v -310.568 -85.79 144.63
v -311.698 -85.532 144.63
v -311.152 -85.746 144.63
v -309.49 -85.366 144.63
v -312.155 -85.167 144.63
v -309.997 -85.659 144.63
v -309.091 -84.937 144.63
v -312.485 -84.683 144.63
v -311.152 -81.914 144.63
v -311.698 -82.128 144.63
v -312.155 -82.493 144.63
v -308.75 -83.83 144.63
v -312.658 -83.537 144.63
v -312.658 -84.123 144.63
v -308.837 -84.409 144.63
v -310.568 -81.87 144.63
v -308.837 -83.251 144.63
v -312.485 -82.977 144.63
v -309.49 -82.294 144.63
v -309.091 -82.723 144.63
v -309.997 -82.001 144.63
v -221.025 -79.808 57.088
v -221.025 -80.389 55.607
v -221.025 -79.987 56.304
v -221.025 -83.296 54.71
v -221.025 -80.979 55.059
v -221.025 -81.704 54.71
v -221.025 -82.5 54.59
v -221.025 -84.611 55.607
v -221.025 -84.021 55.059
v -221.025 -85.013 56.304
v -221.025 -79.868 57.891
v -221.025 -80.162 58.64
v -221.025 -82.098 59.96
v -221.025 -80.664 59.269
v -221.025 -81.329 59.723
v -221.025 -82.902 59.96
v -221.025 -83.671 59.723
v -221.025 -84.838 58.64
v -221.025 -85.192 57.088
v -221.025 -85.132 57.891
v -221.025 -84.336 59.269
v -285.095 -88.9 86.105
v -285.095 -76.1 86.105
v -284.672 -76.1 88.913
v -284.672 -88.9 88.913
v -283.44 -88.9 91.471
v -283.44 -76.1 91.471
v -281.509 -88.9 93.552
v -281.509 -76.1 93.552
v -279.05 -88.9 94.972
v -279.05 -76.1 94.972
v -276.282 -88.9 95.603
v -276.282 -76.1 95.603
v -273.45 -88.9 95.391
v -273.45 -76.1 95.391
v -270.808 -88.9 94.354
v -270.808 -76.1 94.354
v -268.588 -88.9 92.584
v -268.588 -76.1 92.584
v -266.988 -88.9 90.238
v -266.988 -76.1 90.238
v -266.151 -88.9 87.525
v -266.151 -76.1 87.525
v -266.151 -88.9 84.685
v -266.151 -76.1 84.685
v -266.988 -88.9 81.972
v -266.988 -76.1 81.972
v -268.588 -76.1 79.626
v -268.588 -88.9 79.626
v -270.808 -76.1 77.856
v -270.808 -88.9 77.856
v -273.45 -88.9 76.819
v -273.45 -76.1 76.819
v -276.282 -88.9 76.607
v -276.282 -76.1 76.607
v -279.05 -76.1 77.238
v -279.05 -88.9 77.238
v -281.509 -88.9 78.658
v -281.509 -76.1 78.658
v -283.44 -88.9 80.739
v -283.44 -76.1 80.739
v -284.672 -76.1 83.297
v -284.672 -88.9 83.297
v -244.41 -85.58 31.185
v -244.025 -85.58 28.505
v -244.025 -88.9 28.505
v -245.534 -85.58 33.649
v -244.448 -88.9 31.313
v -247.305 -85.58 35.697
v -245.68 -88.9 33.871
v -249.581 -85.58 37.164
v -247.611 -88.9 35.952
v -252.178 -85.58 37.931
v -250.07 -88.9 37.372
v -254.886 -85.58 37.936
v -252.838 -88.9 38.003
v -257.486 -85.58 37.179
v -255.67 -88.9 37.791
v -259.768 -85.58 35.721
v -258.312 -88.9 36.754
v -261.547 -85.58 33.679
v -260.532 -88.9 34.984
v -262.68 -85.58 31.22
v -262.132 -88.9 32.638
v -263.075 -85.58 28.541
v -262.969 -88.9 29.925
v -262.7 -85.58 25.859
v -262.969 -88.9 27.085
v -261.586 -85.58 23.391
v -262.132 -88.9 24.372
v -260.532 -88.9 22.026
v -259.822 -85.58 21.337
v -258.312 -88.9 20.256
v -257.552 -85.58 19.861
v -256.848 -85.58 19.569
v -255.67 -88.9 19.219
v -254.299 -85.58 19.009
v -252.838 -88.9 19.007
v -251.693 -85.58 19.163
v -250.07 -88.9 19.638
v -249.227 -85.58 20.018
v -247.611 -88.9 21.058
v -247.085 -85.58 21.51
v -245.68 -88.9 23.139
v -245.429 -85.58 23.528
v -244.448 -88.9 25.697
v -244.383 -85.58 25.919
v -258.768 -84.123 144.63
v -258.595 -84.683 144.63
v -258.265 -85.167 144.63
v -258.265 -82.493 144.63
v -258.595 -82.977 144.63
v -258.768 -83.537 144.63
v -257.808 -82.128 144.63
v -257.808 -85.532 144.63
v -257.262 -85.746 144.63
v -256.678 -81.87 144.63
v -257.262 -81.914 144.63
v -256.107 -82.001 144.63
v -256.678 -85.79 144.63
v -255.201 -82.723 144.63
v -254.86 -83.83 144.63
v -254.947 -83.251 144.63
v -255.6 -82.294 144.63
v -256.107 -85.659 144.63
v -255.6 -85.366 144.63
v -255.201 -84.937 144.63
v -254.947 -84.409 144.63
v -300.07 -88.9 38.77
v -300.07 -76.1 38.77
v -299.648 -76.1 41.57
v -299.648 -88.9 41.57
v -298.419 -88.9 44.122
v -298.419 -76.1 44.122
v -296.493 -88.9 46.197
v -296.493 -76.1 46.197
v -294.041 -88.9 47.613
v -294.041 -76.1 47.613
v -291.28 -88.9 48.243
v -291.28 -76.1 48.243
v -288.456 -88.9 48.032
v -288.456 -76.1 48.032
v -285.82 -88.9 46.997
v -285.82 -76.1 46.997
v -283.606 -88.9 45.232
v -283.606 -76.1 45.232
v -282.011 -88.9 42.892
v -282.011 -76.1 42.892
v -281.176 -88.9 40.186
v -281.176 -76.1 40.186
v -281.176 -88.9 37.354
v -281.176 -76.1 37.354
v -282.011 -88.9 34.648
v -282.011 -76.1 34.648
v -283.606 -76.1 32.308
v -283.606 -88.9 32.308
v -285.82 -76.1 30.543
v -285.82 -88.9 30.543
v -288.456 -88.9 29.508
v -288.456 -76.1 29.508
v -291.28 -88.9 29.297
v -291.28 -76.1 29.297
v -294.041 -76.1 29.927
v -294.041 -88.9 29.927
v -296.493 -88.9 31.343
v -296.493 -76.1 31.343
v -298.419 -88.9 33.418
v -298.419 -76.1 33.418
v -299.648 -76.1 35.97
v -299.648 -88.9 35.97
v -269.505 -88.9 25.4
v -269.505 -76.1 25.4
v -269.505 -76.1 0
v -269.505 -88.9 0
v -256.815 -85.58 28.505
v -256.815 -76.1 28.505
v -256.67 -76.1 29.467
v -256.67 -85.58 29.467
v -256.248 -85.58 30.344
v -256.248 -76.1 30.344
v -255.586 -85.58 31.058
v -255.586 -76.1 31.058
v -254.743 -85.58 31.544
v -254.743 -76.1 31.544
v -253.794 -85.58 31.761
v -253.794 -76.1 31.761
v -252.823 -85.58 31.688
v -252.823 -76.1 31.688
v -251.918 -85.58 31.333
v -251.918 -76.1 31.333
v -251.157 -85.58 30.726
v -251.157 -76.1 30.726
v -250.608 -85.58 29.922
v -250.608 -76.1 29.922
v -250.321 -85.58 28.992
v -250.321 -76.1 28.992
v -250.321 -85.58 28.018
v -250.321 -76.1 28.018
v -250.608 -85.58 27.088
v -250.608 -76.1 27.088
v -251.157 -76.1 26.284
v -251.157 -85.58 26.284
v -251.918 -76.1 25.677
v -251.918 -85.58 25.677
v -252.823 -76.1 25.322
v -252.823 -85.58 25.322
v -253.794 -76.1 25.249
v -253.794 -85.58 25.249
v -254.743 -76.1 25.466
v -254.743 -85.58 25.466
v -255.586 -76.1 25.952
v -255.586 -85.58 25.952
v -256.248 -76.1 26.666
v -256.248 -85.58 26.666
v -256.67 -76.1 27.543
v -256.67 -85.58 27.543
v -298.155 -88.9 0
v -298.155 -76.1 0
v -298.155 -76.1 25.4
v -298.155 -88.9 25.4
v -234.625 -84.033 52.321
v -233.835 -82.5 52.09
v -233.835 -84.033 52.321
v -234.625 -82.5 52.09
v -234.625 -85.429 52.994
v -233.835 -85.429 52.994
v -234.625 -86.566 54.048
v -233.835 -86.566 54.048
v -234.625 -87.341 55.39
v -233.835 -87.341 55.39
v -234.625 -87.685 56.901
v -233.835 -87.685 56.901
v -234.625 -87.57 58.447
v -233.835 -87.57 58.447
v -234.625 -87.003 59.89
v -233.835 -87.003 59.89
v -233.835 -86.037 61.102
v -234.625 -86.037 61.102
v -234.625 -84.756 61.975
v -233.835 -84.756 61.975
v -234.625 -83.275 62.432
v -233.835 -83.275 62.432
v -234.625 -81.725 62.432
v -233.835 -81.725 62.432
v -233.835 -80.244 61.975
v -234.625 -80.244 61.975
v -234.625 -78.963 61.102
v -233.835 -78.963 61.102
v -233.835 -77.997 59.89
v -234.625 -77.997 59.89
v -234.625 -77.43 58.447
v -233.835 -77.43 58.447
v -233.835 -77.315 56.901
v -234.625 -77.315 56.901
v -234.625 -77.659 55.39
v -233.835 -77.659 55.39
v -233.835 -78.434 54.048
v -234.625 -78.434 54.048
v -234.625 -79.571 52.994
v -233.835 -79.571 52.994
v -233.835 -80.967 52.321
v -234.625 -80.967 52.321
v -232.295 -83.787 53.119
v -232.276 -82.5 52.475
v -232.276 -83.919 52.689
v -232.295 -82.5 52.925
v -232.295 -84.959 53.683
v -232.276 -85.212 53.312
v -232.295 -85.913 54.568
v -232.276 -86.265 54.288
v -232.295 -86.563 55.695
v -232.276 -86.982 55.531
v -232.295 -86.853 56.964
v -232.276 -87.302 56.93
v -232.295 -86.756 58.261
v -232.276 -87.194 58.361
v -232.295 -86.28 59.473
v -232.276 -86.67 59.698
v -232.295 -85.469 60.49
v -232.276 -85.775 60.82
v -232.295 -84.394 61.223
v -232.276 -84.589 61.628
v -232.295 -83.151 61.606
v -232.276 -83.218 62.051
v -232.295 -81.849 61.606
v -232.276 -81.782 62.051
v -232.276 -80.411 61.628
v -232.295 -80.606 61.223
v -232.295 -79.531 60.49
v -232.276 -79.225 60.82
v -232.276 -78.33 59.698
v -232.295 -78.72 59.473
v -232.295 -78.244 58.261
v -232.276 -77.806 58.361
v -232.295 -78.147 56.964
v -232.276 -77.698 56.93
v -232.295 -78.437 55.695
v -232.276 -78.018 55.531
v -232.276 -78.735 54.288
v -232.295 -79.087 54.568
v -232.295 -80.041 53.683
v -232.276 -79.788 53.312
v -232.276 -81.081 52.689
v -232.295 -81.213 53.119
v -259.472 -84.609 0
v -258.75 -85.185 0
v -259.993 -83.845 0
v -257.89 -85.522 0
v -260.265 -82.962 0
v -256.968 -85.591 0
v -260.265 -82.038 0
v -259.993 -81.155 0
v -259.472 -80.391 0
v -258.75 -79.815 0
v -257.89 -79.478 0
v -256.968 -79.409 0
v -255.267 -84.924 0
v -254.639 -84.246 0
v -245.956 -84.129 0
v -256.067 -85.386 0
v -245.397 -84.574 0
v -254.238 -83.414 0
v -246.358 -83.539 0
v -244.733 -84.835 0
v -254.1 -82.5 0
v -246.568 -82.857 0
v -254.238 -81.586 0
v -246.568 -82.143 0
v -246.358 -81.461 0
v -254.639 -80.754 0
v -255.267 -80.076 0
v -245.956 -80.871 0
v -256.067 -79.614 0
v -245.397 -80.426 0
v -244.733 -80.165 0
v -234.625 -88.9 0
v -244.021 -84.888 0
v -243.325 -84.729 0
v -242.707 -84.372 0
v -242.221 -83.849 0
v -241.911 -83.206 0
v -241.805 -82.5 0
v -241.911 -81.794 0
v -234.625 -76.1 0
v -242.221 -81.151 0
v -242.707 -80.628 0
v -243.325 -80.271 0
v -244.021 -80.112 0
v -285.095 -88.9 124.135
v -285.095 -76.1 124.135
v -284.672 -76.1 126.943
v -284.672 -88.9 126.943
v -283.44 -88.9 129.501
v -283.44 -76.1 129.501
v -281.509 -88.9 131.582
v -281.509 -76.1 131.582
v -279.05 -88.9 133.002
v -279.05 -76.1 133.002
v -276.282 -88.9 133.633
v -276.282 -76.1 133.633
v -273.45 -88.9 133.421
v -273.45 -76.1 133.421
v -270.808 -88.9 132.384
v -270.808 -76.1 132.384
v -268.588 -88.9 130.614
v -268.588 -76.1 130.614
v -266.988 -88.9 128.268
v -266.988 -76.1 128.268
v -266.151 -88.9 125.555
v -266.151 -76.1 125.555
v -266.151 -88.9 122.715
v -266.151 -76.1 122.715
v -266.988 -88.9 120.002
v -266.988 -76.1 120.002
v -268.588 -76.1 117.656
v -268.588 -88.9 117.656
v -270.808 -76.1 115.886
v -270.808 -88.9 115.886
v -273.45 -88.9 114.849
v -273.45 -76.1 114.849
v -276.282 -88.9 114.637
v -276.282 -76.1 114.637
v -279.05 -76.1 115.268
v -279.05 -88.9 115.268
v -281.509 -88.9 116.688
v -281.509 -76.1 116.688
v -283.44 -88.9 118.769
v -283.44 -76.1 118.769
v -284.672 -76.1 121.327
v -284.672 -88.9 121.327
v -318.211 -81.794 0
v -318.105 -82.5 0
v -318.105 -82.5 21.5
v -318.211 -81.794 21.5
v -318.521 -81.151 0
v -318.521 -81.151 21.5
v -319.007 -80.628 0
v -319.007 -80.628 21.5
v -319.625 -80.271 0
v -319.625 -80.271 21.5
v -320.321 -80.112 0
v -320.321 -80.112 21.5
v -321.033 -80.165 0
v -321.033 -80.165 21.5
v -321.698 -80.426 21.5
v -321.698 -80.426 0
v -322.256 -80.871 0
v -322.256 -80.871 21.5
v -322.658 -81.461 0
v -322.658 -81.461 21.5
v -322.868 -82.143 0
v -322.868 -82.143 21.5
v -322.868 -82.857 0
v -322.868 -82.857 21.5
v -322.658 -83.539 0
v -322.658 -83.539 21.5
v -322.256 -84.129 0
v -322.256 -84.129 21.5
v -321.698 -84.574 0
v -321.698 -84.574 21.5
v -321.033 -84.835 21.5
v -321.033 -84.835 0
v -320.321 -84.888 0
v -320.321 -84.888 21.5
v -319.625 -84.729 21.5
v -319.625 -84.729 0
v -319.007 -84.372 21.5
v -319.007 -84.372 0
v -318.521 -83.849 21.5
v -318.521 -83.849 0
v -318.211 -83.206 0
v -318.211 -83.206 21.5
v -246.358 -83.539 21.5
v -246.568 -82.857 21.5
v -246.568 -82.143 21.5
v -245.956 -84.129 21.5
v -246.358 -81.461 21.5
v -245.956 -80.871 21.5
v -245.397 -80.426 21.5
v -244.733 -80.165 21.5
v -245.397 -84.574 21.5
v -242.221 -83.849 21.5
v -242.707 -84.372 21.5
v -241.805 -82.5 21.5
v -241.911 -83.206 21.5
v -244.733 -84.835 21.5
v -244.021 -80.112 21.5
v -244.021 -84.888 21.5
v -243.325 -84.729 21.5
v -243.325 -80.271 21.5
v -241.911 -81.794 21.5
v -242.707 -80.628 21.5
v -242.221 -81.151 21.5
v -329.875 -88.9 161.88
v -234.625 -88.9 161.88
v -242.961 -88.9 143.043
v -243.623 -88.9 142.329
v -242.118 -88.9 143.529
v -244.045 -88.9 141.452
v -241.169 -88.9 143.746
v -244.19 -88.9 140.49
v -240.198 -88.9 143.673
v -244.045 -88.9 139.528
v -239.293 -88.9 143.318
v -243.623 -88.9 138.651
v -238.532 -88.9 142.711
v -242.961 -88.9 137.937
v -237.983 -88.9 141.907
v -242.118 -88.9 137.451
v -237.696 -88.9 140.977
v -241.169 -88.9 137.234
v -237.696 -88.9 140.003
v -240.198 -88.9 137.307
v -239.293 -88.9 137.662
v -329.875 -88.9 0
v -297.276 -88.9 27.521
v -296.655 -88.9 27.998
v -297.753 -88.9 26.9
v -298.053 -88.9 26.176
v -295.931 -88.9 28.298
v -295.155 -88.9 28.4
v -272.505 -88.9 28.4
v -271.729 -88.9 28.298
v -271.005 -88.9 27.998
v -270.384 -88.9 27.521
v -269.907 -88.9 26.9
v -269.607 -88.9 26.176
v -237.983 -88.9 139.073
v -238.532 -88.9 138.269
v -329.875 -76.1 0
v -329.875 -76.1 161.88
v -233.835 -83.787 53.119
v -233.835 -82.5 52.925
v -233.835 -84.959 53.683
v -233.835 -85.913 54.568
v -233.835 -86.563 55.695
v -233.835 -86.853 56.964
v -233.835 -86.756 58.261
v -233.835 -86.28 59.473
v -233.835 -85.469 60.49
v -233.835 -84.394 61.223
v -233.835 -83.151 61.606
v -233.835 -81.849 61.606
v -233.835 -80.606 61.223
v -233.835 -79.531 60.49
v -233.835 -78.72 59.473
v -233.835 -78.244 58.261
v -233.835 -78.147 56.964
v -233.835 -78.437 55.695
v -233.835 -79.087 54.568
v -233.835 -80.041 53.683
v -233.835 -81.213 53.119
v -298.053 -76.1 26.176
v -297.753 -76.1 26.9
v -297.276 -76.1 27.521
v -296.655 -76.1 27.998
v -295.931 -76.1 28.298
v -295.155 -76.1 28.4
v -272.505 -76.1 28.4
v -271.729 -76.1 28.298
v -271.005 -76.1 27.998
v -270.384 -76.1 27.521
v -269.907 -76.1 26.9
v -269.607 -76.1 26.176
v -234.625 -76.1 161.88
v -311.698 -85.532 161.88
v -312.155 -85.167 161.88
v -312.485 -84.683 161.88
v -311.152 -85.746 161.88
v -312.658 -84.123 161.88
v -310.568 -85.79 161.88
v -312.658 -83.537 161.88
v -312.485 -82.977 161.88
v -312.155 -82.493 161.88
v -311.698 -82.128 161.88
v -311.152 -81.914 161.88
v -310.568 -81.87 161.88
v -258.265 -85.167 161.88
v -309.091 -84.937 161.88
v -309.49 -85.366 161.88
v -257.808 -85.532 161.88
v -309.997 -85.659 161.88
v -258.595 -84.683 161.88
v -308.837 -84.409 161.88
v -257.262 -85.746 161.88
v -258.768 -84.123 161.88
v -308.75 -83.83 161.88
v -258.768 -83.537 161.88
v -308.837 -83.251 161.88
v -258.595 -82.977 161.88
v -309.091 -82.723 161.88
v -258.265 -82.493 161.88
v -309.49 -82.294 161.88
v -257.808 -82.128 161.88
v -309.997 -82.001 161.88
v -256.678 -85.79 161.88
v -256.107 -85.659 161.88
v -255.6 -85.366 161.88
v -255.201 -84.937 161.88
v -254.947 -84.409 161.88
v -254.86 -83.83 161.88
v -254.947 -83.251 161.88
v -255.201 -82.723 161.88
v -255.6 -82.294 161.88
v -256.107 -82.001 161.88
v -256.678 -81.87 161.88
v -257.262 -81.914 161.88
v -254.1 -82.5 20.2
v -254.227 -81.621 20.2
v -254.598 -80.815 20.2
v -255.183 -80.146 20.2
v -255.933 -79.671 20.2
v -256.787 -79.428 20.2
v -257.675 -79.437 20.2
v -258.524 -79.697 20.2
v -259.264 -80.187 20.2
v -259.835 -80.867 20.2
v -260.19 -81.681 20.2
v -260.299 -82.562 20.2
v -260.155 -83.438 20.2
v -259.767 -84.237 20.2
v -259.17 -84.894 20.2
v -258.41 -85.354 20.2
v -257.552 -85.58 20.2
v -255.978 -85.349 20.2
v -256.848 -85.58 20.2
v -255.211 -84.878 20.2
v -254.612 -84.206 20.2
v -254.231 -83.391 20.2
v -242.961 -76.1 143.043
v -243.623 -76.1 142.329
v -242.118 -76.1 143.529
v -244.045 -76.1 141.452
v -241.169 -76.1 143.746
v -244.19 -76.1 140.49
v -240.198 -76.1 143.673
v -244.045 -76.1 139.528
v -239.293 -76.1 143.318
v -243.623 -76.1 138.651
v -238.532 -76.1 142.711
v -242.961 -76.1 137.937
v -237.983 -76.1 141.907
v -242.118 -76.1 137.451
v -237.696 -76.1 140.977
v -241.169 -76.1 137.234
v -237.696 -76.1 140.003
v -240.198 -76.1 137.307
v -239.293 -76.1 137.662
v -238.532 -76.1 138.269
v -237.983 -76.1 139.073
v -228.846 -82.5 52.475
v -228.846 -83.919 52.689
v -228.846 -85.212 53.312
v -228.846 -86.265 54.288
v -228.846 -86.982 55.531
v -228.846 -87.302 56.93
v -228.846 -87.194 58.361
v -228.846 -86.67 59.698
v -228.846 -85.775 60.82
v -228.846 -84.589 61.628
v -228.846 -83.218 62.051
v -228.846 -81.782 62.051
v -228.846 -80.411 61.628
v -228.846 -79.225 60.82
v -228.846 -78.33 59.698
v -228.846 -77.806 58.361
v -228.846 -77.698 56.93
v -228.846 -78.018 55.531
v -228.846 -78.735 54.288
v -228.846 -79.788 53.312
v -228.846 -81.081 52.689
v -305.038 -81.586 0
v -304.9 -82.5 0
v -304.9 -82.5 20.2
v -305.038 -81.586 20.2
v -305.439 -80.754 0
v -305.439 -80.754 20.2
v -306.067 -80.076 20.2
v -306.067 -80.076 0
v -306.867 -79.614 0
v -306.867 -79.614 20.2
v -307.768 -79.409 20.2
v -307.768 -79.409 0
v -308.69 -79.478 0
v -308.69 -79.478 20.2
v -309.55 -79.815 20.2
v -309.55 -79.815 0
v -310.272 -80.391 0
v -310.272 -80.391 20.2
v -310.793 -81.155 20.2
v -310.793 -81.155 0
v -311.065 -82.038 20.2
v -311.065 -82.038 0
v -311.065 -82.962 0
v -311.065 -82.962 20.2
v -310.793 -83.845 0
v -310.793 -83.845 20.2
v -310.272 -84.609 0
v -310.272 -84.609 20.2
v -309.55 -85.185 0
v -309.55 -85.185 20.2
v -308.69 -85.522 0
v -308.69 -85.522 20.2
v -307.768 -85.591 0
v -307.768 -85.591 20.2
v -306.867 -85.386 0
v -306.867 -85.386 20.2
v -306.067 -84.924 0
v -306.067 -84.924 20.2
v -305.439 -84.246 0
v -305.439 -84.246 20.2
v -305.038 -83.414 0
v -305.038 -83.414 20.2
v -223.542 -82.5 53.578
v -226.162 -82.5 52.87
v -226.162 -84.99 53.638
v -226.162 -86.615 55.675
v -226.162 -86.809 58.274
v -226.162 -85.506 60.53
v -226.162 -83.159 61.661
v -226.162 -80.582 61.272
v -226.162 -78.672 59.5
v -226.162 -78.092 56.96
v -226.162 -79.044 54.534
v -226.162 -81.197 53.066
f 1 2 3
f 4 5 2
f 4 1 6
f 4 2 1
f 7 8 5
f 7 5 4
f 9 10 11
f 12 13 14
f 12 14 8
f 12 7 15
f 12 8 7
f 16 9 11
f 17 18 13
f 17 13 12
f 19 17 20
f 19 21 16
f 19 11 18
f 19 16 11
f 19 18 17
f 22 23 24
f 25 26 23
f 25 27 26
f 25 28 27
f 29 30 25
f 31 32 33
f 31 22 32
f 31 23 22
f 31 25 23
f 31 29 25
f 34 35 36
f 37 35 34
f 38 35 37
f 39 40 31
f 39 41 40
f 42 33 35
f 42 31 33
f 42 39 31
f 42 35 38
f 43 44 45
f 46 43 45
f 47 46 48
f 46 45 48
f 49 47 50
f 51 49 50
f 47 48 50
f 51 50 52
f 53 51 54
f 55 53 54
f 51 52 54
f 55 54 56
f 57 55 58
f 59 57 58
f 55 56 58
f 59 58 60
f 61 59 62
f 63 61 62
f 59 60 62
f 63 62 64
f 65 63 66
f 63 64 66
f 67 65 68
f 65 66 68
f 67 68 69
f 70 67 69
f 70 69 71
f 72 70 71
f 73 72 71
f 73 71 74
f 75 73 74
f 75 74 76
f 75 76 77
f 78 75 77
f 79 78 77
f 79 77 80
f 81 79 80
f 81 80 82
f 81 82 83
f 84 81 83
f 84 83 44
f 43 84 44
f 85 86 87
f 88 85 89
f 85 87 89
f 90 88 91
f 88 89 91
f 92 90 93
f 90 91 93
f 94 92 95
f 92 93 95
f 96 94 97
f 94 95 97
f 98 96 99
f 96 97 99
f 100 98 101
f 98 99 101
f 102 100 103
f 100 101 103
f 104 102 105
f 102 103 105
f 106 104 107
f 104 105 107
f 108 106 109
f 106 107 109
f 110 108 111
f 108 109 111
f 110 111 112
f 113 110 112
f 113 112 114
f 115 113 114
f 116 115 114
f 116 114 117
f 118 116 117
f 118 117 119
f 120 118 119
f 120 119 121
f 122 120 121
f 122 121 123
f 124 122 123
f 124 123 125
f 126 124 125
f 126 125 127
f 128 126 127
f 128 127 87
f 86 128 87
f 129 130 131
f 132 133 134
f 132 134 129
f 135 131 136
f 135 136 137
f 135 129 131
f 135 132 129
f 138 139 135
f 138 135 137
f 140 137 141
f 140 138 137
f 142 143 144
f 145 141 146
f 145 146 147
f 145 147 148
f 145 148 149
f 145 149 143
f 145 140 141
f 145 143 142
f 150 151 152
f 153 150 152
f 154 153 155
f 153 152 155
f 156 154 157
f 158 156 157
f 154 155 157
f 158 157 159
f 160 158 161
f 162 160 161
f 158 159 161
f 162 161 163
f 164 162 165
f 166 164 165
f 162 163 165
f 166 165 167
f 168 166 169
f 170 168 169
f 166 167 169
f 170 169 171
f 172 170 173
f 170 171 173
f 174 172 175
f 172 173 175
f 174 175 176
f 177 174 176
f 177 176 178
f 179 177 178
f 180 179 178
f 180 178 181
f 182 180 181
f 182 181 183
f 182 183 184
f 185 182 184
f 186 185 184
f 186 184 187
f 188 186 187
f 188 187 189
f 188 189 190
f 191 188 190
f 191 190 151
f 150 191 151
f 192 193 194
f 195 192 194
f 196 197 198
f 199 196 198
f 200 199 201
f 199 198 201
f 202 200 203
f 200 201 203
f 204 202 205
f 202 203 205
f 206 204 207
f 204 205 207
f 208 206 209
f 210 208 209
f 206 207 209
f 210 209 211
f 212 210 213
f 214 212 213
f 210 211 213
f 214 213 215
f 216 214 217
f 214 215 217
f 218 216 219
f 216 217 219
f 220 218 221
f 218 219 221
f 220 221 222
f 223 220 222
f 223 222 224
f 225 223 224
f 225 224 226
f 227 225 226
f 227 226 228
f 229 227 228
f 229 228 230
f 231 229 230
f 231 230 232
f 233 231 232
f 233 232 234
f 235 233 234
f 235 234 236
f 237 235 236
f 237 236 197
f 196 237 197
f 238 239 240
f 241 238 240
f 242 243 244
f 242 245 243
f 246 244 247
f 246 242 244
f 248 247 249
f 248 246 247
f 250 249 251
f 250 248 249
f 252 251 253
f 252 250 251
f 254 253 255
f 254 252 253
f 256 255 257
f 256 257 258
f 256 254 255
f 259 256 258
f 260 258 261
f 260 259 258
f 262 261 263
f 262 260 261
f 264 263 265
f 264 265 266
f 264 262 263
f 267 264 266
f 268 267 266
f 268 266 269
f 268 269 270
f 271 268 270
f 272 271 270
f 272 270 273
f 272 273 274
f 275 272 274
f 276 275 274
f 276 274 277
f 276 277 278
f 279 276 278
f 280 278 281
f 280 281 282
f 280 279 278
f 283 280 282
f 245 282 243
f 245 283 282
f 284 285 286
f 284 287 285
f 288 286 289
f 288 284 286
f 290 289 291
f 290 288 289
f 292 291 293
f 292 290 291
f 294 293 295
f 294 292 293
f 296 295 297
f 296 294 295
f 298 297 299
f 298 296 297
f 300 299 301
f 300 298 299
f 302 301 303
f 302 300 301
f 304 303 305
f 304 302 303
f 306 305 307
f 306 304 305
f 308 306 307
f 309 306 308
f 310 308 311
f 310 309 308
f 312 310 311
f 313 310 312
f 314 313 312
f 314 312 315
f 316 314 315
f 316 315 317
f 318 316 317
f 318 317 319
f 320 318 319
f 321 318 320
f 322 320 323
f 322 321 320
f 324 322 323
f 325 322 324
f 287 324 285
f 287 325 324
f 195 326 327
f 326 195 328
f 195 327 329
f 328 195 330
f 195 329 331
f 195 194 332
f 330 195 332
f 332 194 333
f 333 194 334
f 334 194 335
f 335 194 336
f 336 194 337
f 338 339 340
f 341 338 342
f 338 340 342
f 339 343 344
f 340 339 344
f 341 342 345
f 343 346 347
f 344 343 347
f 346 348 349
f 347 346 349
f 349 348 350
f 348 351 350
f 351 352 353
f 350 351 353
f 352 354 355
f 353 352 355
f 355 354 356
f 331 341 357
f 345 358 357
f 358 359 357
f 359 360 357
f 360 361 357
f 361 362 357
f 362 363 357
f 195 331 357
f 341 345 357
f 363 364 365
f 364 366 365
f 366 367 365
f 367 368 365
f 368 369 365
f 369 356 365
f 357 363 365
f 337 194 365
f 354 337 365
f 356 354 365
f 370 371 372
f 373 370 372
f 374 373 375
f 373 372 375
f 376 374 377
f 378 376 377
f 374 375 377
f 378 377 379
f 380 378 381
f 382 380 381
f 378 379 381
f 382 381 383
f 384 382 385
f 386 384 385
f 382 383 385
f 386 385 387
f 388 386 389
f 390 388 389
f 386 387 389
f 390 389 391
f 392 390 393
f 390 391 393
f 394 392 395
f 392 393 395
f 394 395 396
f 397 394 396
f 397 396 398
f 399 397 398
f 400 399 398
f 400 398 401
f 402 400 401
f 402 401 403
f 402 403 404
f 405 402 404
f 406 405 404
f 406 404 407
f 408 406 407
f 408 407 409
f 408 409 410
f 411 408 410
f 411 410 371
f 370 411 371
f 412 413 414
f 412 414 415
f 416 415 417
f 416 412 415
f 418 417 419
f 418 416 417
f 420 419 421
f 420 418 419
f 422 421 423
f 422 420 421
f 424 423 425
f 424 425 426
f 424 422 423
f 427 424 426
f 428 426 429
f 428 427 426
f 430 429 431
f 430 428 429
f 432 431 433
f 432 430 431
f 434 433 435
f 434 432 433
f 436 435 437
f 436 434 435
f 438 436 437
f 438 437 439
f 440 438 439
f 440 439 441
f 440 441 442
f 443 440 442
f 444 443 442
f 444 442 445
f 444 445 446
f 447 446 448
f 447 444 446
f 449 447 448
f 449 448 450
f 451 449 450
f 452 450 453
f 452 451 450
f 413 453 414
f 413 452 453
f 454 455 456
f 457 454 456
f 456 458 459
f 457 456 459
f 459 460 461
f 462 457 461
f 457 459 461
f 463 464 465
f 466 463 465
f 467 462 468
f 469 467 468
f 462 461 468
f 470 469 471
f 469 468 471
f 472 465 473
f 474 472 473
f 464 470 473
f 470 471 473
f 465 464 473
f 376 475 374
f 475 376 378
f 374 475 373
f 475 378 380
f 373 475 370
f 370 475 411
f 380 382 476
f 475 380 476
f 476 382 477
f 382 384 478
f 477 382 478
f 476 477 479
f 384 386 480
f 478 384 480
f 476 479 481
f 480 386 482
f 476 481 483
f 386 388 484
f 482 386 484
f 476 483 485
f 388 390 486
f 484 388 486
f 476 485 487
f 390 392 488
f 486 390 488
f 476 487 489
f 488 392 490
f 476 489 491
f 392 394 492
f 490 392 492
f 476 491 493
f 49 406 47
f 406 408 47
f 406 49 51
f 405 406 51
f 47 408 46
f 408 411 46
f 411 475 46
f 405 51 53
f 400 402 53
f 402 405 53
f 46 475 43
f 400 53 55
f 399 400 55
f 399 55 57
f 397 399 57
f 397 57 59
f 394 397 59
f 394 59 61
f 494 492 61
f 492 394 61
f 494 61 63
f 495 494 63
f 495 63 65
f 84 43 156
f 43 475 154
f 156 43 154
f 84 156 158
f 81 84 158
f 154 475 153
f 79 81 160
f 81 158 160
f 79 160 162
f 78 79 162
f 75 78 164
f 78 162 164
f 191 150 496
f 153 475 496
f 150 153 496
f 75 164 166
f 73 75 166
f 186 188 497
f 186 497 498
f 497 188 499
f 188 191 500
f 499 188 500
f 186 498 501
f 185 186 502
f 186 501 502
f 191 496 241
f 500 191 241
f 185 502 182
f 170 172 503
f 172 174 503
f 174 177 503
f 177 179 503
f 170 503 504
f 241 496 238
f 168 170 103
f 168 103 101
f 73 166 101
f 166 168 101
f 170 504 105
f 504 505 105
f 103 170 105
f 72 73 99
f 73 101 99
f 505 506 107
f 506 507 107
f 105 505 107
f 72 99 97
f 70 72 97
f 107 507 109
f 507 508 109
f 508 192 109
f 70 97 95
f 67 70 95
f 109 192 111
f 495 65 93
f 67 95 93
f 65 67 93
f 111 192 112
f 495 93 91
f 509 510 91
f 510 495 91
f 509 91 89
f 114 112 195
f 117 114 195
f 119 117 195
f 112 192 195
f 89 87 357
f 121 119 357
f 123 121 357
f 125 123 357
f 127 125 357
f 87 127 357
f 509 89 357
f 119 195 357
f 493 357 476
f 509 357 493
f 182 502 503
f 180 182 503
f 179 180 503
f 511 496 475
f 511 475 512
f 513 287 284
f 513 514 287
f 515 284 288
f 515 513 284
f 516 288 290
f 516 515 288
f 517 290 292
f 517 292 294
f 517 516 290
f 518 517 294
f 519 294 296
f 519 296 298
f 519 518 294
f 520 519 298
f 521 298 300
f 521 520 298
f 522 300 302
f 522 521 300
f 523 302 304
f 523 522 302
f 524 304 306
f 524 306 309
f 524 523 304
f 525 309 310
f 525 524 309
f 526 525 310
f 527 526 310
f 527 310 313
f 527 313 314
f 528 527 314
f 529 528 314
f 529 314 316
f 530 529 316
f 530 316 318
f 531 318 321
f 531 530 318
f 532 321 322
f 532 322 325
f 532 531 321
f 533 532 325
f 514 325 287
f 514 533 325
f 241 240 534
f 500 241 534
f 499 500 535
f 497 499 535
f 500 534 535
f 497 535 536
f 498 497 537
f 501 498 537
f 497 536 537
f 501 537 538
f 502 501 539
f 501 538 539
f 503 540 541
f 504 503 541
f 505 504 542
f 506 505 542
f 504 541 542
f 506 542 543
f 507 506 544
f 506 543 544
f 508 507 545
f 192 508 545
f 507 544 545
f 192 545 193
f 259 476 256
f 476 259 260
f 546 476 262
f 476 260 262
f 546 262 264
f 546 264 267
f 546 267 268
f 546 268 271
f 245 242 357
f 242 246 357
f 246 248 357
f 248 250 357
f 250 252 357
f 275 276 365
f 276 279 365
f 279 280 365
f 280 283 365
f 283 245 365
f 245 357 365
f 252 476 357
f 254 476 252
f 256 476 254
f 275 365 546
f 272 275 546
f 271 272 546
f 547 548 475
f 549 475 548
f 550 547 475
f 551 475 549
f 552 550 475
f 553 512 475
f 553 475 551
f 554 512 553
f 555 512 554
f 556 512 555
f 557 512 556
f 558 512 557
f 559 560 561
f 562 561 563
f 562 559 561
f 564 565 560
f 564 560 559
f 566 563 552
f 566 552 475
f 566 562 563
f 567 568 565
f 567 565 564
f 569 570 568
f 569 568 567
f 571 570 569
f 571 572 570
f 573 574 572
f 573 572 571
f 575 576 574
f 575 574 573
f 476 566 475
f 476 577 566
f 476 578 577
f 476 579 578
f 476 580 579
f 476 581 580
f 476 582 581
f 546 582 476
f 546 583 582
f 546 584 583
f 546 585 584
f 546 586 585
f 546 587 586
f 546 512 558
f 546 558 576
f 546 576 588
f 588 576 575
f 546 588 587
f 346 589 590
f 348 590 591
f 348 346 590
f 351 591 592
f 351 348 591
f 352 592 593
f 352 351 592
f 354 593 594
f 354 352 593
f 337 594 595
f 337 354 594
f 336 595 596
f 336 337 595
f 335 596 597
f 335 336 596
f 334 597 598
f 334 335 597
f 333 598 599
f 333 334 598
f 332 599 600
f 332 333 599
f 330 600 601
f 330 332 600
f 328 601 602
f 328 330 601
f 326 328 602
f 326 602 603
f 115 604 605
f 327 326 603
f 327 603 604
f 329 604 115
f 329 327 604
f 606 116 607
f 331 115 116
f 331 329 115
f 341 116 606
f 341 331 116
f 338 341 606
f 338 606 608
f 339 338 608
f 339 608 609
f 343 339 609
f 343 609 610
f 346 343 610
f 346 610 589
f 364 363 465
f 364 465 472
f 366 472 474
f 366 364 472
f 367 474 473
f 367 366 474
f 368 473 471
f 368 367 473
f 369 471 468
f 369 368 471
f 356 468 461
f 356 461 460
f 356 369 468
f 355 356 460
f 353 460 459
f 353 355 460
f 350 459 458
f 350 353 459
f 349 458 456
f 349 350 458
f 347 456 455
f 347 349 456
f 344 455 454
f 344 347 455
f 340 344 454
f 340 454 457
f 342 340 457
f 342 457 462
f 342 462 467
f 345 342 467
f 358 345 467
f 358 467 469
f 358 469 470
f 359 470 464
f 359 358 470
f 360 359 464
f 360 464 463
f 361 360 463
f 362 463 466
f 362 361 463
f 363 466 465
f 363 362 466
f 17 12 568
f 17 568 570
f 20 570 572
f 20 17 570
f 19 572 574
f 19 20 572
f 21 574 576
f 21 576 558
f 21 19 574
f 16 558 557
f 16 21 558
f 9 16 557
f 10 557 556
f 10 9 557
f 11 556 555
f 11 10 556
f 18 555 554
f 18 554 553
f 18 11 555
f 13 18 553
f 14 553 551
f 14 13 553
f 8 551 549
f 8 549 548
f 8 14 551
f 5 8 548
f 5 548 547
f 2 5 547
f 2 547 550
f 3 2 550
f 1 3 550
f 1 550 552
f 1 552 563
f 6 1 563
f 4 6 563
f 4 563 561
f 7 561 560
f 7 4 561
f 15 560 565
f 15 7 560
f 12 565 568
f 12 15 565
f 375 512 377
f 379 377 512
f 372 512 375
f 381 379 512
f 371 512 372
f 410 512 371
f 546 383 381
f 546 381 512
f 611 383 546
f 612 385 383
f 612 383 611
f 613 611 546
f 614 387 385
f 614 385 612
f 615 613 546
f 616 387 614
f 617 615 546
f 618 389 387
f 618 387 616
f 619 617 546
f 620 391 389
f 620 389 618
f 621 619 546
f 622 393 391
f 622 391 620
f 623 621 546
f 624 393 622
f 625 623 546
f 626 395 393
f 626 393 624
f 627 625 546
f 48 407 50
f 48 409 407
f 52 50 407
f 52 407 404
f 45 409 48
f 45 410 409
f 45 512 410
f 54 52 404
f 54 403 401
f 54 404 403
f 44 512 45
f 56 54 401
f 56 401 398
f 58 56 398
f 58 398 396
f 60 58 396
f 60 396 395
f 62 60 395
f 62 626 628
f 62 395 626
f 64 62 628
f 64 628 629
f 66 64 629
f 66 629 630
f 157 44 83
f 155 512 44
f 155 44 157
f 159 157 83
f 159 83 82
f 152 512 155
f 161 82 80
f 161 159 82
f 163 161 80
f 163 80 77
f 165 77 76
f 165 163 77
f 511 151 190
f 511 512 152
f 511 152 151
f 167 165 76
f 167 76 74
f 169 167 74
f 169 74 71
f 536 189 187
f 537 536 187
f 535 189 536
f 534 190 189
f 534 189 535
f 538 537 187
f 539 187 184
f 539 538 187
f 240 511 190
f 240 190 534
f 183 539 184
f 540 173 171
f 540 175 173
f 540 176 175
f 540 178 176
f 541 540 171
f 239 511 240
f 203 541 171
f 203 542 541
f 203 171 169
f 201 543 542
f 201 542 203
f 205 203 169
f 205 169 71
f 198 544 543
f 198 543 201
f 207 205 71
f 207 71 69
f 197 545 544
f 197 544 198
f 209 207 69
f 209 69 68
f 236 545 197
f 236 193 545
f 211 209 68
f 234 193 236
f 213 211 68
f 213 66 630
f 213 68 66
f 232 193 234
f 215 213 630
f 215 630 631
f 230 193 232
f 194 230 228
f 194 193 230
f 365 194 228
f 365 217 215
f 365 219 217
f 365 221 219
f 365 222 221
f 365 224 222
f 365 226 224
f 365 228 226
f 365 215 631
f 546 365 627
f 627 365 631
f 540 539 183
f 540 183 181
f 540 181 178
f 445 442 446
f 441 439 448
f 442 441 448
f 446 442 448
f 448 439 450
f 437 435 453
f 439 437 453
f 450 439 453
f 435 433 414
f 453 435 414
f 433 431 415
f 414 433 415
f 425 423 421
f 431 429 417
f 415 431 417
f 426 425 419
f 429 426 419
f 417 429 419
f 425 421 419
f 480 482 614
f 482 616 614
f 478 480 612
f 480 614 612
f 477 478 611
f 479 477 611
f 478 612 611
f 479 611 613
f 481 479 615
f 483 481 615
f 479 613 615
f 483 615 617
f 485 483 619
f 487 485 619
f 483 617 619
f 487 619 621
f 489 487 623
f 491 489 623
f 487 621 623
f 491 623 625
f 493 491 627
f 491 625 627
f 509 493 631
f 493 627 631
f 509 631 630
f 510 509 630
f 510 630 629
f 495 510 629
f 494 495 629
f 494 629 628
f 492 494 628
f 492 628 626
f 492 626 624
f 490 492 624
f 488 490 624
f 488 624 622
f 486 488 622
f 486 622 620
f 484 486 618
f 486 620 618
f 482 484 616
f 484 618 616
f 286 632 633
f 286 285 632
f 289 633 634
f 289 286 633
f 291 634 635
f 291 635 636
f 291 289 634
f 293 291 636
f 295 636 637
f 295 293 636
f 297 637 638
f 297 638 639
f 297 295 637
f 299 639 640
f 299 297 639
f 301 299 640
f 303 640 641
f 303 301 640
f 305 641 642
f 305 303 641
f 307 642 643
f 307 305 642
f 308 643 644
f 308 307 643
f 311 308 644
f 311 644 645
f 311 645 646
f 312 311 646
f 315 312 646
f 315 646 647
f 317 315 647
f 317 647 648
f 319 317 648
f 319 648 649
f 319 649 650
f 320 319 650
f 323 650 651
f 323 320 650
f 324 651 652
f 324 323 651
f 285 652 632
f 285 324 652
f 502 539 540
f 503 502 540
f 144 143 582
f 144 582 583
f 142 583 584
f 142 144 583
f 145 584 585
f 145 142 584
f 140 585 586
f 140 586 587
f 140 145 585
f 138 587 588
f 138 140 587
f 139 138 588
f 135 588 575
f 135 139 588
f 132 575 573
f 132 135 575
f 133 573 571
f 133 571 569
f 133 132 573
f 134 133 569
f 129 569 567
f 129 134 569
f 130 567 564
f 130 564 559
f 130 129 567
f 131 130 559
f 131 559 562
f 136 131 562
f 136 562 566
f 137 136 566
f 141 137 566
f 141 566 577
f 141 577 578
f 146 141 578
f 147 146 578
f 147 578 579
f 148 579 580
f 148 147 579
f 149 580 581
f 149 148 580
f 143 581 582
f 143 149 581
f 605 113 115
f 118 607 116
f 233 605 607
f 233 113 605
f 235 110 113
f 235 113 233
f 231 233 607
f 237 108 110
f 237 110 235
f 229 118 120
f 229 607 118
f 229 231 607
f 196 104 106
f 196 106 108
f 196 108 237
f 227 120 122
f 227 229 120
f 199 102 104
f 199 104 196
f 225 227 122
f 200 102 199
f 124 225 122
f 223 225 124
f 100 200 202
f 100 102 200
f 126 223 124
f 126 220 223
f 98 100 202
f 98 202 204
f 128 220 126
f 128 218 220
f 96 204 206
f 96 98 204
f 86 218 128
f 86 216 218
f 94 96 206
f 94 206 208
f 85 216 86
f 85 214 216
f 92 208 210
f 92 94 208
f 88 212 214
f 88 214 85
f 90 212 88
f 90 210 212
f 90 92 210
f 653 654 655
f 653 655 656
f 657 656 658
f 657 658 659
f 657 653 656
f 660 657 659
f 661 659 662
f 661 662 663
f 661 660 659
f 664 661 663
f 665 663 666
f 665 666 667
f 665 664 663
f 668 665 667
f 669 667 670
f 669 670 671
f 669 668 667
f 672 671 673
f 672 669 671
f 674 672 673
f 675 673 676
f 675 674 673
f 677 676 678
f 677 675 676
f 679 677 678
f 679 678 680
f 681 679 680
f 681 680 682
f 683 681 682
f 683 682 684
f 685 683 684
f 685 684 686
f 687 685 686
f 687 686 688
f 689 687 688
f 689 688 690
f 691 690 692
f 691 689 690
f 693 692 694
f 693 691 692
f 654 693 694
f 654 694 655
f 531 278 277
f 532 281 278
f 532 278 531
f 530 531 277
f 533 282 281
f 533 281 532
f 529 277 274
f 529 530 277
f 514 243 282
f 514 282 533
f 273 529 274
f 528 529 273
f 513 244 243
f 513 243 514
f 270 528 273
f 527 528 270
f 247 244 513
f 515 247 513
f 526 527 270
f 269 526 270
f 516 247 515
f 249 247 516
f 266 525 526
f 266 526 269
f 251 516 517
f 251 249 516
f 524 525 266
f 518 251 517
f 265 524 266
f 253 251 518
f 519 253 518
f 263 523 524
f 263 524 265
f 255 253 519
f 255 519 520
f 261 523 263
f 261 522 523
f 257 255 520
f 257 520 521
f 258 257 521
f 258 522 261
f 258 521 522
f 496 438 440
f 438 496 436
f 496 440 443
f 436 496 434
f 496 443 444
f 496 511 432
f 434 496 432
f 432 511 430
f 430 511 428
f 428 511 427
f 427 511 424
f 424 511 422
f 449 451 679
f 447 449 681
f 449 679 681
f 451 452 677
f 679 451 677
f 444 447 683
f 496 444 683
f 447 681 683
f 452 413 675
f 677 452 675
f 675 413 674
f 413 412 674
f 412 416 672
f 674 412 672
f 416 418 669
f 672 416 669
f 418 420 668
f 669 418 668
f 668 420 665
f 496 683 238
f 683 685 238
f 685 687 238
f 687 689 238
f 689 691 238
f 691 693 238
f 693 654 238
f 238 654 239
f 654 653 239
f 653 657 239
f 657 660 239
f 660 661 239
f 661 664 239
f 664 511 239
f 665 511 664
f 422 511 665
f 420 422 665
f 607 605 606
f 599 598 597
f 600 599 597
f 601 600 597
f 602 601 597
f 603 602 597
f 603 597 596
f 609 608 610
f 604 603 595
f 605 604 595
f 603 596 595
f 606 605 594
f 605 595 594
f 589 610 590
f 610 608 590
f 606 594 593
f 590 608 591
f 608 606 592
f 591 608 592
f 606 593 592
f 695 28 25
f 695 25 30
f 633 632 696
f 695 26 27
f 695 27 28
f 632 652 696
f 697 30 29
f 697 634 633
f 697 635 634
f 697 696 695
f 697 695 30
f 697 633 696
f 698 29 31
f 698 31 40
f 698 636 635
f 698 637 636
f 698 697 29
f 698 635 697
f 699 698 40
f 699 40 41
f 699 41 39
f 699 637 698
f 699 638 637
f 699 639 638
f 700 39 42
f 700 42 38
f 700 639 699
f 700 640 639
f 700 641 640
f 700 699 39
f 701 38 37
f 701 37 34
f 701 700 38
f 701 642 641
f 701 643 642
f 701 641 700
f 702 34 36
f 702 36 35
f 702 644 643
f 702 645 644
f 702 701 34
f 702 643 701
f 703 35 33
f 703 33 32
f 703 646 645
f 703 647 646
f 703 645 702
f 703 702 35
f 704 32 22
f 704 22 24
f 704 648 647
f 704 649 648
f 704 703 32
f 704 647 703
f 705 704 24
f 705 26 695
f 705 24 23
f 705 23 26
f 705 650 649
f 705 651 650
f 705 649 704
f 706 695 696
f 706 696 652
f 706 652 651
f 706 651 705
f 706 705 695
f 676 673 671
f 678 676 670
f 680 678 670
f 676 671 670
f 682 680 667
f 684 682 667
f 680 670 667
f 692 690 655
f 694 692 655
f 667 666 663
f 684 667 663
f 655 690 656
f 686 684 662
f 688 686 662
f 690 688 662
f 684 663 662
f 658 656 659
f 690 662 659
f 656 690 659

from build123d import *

# Parameters (mm, degrees)
SKETCH1_W           = 95.25
SKETCH1_H           = 12.8
BOSS_EXTRUDE1_DEPTH = 161.88
SKETCH1_3_R         = 3.1
CUT_EXTRUDE1_DEPTH  = 20.2
SKETCH1_4_R         = 2.395
CUT_EXTRUDE2_DEPTH  = 21.5
CUT_EXTRUDE3_REACH  = 14.8
SKETCH2_R           = 9.525
SKETCH2_R_2         = 3.265
SKETCH3_R           = 3.265
SKETCH3_R_2         = 9.525
CUT_EXTRUDE4_DEPTH  = 3.32
CUT_EXTRUDE5_START  = -17.25
SKETCH4_R           = 1.965
CUT_EXTRUDE5_DEPTH  = 17.25
SKETCH6_R           = 9.5
CUT_EXTRUDE6_DEPTH  = 13.8000001


with BuildPart() as part:
    # Sketch1 → Boss-Extrude1 (new body)
    with BuildSketch(Plane.XY):
        with Locations((-282.25, -82.5)):
            Rectangle(SKETCH1_W, SKETCH1_H)
    extrude(amount=BOSS_EXTRUDE1_DEPTH)

    # Sketch1<3> → Cut-Extrude1 (cut)
    with BuildSketch(Plane.XY):
        with Locations((-308, -82.5)):
            Circle(SKETCH1_3_R)
        with Locations((-257.2, -82.5)):
            Circle(SKETCH1_3_R)
    extrude(amount=CUT_EXTRUDE1_DEPTH, mode=Mode.SUBTRACT)

    # Sketch1<4> → Cut-Extrude2 (cut)
    with BuildSketch(Plane.XY):
        with Locations((-320.5, -82.5)):
            Circle(SKETCH1_4_R)
        with Locations((-244.2, -82.5)):
            Circle(SKETCH1_4_R)
    extrude(amount=CUT_EXTRUDE2_DEPTH, mode=Mode.SUBTRACT)

    # Sketch2 → Cut-Extrude3 (cut, up to next)
    with BuildSketch(Plane(origin=(0, -76.1, 0), x_dir=(-1, 0, 0), z_dir=(0, 1, 0)), mode=Mode.PRIVATE) as cut_extrude3_sk1:
        with Locations((275.57, 86.105)):
            Circle(SKETCH2_R)
    cut_extrude3_tool1 = extrude(cut_extrude3_sk1.sketch, amount=-CUT_EXTRUDE3_REACH, mode=Mode.PRIVATE) & part.part
    add(cut_extrude3_tool1.solids().sort_by_distance((-275.57, -76.1, 86.105))[0], mode=Mode.SUBTRACT)
    # Sketch2 → Cut-Extrude3 (cut, up to next)
    with BuildSketch(Plane(origin=(0, -76.1, 0), x_dir=(-1, 0, 0), z_dir=(0, 1, 0)), mode=Mode.PRIVATE) as cut_extrude3_sk2:
        with Locations((275.57, 124.135)):
            Circle(SKETCH2_R)
    cut_extrude3_tool2 = extrude(cut_extrude3_sk2.sketch, amount=-CUT_EXTRUDE3_REACH, mode=Mode.PRIVATE) & part.part
    add(cut_extrude3_tool2.solids().sort_by_distance((-275.57, -76.1, 124.135))[0], mode=Mode.SUBTRACT)
    # Sketch2 → Cut-Extrude3 (cut, up to next)
    with BuildSketch(Plane(origin=(0, -76.1, 0), x_dir=(-1, 0, 0), z_dir=(0, 1, 0)), mode=Mode.PRIVATE) as cut_extrude3_sk3:
        with Locations((253.55, 28.505)):
            Circle(SKETCH2_R_2)
    cut_extrude3_tool3 = extrude(cut_extrude3_sk3.sketch, amount=-CUT_EXTRUDE3_REACH, mode=Mode.PRIVATE) & part.part
    add(cut_extrude3_tool3.solids().sort_by_distance((-253.55, -76.1, 28.505))[0], mode=Mode.SUBTRACT)
    # Sketch2 → Cut-Extrude3 (cut, up to next)
    with BuildSketch(Plane(origin=(0, -76.1, 0), x_dir=(-1, 0, 0), z_dir=(0, 1, 0)), mode=Mode.PRIVATE) as cut_extrude3_sk4:
        with Locations((240.925, 140.49)):
            Circle(SKETCH2_R_2)
    cut_extrude3_tool4 = extrude(cut_extrude3_sk4.sketch, amount=-CUT_EXTRUDE3_REACH, mode=Mode.PRIVATE) & part.part
    add(cut_extrude3_tool4.solids().sort_by_distance((-240.925, -76.1, 140.49))[0], mode=Mode.SUBTRACT)
    # Sketch2 → Cut-Extrude3 (cut, up to next)
    with BuildSketch(Plane(origin=(0, -76.1, 0), x_dir=(-1, 0, 0), z_dir=(0, 1, 0)), mode=Mode.PRIVATE) as cut_extrude3_sk5:
        with BuildLine():
            Line((269.505, 25.4), (269.505, 0))
            Line((269.505, 0), (298.155, 0))
            Line((298.155, 0), (298.155, 25.4))
            ThreePointArc((298.155, 25.4), (297.276320344, 27.521320344), (295.155, 28.4))
            Line((295.155, 28.4), (272.505, 28.4))
            ThreePointArc((272.505, 28.4), (270.383679656, 27.521320344), (269.505, 25.4))
        make_face()
    cut_extrude3_tool5 = extrude(cut_extrude3_sk5.sketch, amount=-CUT_EXTRUDE3_REACH, mode=Mode.PRIVATE) & part.part
    add(cut_extrude3_tool5.solids().sort_by_distance((-283.83, -76.1, 14.135461))[0], mode=Mode.SUBTRACT)

    # Sketch3 → Cut-Extrude4 (cut)
    with BuildSketch(Plane.XZ.offset(88.9)):
        with Locations((-240.925, 140.49)):
            Circle(SKETCH3_R)
        with Locations((-253.55, 28.505)):
            Circle(SKETCH3_R_2)
    extrude(amount=-CUT_EXTRUDE4_DEPTH, mode=Mode.SUBTRACT)

    # Sketch4 → Cut-Extrude5 (cut)
    with BuildSketch(Plane.XY.offset(161.88).offset(CUT_EXTRUDE5_START)):
        with Locations((-256.825, -83.83)):
            Circle(SKETCH4_R)
        with Locations((-310.715, -83.83)):
            Circle(SKETCH4_R)
    extrude(amount=CUT_EXTRUDE5_DEPTH, mode=Mode.SUBTRACT)

    # Sketch5 → Revolve1 (revolve)
    with BuildSketch(Plane(origin=(0, -82.5, 0), x_dir=(-1, 0, 0), z_dir=(0, 1, 0))):
        with BuildLine():
            Line((234.625, 57.29), (221.025, 57.29))
            Line((221.025, 57.29), (221.025, 54.59))
            ThreePointArc((221.025, 54.59), (224.841543887, 53.18542762), (228.845807042, 52.475))
            Line((228.845807042, 52.475), (232.275807042, 52.475))
            Line((232.275807042, 52.475), (232.295, 52.925))
            Line((232.295, 52.925), (233.835, 52.925))
            Line((233.835, 52.925), (233.835, 52.09))
            Line((233.835, 52.09), (234.625, 52.09))
            Line((234.625, 52.09), (234.625, 57.29))
        make_face()
    revolve(axis=Axis((-234.625, -82.5, 57.29), (-1, 0, 0)))

    # Sketch6 → Cut-Extrude6 (cut, through all)
    with BuildSketch(Plane(origin=(0, -76.1, 0), x_dir=(-1, 0, 0), z_dir=(0, 1, 0))):
        with Locations((290.57, 38.77)):
            Circle(SKETCH6_R)
    extrude(amount=-CUT_EXTRUDE6_DEPTH, mode=Mode.SUBTRACT)


solid = part.part
